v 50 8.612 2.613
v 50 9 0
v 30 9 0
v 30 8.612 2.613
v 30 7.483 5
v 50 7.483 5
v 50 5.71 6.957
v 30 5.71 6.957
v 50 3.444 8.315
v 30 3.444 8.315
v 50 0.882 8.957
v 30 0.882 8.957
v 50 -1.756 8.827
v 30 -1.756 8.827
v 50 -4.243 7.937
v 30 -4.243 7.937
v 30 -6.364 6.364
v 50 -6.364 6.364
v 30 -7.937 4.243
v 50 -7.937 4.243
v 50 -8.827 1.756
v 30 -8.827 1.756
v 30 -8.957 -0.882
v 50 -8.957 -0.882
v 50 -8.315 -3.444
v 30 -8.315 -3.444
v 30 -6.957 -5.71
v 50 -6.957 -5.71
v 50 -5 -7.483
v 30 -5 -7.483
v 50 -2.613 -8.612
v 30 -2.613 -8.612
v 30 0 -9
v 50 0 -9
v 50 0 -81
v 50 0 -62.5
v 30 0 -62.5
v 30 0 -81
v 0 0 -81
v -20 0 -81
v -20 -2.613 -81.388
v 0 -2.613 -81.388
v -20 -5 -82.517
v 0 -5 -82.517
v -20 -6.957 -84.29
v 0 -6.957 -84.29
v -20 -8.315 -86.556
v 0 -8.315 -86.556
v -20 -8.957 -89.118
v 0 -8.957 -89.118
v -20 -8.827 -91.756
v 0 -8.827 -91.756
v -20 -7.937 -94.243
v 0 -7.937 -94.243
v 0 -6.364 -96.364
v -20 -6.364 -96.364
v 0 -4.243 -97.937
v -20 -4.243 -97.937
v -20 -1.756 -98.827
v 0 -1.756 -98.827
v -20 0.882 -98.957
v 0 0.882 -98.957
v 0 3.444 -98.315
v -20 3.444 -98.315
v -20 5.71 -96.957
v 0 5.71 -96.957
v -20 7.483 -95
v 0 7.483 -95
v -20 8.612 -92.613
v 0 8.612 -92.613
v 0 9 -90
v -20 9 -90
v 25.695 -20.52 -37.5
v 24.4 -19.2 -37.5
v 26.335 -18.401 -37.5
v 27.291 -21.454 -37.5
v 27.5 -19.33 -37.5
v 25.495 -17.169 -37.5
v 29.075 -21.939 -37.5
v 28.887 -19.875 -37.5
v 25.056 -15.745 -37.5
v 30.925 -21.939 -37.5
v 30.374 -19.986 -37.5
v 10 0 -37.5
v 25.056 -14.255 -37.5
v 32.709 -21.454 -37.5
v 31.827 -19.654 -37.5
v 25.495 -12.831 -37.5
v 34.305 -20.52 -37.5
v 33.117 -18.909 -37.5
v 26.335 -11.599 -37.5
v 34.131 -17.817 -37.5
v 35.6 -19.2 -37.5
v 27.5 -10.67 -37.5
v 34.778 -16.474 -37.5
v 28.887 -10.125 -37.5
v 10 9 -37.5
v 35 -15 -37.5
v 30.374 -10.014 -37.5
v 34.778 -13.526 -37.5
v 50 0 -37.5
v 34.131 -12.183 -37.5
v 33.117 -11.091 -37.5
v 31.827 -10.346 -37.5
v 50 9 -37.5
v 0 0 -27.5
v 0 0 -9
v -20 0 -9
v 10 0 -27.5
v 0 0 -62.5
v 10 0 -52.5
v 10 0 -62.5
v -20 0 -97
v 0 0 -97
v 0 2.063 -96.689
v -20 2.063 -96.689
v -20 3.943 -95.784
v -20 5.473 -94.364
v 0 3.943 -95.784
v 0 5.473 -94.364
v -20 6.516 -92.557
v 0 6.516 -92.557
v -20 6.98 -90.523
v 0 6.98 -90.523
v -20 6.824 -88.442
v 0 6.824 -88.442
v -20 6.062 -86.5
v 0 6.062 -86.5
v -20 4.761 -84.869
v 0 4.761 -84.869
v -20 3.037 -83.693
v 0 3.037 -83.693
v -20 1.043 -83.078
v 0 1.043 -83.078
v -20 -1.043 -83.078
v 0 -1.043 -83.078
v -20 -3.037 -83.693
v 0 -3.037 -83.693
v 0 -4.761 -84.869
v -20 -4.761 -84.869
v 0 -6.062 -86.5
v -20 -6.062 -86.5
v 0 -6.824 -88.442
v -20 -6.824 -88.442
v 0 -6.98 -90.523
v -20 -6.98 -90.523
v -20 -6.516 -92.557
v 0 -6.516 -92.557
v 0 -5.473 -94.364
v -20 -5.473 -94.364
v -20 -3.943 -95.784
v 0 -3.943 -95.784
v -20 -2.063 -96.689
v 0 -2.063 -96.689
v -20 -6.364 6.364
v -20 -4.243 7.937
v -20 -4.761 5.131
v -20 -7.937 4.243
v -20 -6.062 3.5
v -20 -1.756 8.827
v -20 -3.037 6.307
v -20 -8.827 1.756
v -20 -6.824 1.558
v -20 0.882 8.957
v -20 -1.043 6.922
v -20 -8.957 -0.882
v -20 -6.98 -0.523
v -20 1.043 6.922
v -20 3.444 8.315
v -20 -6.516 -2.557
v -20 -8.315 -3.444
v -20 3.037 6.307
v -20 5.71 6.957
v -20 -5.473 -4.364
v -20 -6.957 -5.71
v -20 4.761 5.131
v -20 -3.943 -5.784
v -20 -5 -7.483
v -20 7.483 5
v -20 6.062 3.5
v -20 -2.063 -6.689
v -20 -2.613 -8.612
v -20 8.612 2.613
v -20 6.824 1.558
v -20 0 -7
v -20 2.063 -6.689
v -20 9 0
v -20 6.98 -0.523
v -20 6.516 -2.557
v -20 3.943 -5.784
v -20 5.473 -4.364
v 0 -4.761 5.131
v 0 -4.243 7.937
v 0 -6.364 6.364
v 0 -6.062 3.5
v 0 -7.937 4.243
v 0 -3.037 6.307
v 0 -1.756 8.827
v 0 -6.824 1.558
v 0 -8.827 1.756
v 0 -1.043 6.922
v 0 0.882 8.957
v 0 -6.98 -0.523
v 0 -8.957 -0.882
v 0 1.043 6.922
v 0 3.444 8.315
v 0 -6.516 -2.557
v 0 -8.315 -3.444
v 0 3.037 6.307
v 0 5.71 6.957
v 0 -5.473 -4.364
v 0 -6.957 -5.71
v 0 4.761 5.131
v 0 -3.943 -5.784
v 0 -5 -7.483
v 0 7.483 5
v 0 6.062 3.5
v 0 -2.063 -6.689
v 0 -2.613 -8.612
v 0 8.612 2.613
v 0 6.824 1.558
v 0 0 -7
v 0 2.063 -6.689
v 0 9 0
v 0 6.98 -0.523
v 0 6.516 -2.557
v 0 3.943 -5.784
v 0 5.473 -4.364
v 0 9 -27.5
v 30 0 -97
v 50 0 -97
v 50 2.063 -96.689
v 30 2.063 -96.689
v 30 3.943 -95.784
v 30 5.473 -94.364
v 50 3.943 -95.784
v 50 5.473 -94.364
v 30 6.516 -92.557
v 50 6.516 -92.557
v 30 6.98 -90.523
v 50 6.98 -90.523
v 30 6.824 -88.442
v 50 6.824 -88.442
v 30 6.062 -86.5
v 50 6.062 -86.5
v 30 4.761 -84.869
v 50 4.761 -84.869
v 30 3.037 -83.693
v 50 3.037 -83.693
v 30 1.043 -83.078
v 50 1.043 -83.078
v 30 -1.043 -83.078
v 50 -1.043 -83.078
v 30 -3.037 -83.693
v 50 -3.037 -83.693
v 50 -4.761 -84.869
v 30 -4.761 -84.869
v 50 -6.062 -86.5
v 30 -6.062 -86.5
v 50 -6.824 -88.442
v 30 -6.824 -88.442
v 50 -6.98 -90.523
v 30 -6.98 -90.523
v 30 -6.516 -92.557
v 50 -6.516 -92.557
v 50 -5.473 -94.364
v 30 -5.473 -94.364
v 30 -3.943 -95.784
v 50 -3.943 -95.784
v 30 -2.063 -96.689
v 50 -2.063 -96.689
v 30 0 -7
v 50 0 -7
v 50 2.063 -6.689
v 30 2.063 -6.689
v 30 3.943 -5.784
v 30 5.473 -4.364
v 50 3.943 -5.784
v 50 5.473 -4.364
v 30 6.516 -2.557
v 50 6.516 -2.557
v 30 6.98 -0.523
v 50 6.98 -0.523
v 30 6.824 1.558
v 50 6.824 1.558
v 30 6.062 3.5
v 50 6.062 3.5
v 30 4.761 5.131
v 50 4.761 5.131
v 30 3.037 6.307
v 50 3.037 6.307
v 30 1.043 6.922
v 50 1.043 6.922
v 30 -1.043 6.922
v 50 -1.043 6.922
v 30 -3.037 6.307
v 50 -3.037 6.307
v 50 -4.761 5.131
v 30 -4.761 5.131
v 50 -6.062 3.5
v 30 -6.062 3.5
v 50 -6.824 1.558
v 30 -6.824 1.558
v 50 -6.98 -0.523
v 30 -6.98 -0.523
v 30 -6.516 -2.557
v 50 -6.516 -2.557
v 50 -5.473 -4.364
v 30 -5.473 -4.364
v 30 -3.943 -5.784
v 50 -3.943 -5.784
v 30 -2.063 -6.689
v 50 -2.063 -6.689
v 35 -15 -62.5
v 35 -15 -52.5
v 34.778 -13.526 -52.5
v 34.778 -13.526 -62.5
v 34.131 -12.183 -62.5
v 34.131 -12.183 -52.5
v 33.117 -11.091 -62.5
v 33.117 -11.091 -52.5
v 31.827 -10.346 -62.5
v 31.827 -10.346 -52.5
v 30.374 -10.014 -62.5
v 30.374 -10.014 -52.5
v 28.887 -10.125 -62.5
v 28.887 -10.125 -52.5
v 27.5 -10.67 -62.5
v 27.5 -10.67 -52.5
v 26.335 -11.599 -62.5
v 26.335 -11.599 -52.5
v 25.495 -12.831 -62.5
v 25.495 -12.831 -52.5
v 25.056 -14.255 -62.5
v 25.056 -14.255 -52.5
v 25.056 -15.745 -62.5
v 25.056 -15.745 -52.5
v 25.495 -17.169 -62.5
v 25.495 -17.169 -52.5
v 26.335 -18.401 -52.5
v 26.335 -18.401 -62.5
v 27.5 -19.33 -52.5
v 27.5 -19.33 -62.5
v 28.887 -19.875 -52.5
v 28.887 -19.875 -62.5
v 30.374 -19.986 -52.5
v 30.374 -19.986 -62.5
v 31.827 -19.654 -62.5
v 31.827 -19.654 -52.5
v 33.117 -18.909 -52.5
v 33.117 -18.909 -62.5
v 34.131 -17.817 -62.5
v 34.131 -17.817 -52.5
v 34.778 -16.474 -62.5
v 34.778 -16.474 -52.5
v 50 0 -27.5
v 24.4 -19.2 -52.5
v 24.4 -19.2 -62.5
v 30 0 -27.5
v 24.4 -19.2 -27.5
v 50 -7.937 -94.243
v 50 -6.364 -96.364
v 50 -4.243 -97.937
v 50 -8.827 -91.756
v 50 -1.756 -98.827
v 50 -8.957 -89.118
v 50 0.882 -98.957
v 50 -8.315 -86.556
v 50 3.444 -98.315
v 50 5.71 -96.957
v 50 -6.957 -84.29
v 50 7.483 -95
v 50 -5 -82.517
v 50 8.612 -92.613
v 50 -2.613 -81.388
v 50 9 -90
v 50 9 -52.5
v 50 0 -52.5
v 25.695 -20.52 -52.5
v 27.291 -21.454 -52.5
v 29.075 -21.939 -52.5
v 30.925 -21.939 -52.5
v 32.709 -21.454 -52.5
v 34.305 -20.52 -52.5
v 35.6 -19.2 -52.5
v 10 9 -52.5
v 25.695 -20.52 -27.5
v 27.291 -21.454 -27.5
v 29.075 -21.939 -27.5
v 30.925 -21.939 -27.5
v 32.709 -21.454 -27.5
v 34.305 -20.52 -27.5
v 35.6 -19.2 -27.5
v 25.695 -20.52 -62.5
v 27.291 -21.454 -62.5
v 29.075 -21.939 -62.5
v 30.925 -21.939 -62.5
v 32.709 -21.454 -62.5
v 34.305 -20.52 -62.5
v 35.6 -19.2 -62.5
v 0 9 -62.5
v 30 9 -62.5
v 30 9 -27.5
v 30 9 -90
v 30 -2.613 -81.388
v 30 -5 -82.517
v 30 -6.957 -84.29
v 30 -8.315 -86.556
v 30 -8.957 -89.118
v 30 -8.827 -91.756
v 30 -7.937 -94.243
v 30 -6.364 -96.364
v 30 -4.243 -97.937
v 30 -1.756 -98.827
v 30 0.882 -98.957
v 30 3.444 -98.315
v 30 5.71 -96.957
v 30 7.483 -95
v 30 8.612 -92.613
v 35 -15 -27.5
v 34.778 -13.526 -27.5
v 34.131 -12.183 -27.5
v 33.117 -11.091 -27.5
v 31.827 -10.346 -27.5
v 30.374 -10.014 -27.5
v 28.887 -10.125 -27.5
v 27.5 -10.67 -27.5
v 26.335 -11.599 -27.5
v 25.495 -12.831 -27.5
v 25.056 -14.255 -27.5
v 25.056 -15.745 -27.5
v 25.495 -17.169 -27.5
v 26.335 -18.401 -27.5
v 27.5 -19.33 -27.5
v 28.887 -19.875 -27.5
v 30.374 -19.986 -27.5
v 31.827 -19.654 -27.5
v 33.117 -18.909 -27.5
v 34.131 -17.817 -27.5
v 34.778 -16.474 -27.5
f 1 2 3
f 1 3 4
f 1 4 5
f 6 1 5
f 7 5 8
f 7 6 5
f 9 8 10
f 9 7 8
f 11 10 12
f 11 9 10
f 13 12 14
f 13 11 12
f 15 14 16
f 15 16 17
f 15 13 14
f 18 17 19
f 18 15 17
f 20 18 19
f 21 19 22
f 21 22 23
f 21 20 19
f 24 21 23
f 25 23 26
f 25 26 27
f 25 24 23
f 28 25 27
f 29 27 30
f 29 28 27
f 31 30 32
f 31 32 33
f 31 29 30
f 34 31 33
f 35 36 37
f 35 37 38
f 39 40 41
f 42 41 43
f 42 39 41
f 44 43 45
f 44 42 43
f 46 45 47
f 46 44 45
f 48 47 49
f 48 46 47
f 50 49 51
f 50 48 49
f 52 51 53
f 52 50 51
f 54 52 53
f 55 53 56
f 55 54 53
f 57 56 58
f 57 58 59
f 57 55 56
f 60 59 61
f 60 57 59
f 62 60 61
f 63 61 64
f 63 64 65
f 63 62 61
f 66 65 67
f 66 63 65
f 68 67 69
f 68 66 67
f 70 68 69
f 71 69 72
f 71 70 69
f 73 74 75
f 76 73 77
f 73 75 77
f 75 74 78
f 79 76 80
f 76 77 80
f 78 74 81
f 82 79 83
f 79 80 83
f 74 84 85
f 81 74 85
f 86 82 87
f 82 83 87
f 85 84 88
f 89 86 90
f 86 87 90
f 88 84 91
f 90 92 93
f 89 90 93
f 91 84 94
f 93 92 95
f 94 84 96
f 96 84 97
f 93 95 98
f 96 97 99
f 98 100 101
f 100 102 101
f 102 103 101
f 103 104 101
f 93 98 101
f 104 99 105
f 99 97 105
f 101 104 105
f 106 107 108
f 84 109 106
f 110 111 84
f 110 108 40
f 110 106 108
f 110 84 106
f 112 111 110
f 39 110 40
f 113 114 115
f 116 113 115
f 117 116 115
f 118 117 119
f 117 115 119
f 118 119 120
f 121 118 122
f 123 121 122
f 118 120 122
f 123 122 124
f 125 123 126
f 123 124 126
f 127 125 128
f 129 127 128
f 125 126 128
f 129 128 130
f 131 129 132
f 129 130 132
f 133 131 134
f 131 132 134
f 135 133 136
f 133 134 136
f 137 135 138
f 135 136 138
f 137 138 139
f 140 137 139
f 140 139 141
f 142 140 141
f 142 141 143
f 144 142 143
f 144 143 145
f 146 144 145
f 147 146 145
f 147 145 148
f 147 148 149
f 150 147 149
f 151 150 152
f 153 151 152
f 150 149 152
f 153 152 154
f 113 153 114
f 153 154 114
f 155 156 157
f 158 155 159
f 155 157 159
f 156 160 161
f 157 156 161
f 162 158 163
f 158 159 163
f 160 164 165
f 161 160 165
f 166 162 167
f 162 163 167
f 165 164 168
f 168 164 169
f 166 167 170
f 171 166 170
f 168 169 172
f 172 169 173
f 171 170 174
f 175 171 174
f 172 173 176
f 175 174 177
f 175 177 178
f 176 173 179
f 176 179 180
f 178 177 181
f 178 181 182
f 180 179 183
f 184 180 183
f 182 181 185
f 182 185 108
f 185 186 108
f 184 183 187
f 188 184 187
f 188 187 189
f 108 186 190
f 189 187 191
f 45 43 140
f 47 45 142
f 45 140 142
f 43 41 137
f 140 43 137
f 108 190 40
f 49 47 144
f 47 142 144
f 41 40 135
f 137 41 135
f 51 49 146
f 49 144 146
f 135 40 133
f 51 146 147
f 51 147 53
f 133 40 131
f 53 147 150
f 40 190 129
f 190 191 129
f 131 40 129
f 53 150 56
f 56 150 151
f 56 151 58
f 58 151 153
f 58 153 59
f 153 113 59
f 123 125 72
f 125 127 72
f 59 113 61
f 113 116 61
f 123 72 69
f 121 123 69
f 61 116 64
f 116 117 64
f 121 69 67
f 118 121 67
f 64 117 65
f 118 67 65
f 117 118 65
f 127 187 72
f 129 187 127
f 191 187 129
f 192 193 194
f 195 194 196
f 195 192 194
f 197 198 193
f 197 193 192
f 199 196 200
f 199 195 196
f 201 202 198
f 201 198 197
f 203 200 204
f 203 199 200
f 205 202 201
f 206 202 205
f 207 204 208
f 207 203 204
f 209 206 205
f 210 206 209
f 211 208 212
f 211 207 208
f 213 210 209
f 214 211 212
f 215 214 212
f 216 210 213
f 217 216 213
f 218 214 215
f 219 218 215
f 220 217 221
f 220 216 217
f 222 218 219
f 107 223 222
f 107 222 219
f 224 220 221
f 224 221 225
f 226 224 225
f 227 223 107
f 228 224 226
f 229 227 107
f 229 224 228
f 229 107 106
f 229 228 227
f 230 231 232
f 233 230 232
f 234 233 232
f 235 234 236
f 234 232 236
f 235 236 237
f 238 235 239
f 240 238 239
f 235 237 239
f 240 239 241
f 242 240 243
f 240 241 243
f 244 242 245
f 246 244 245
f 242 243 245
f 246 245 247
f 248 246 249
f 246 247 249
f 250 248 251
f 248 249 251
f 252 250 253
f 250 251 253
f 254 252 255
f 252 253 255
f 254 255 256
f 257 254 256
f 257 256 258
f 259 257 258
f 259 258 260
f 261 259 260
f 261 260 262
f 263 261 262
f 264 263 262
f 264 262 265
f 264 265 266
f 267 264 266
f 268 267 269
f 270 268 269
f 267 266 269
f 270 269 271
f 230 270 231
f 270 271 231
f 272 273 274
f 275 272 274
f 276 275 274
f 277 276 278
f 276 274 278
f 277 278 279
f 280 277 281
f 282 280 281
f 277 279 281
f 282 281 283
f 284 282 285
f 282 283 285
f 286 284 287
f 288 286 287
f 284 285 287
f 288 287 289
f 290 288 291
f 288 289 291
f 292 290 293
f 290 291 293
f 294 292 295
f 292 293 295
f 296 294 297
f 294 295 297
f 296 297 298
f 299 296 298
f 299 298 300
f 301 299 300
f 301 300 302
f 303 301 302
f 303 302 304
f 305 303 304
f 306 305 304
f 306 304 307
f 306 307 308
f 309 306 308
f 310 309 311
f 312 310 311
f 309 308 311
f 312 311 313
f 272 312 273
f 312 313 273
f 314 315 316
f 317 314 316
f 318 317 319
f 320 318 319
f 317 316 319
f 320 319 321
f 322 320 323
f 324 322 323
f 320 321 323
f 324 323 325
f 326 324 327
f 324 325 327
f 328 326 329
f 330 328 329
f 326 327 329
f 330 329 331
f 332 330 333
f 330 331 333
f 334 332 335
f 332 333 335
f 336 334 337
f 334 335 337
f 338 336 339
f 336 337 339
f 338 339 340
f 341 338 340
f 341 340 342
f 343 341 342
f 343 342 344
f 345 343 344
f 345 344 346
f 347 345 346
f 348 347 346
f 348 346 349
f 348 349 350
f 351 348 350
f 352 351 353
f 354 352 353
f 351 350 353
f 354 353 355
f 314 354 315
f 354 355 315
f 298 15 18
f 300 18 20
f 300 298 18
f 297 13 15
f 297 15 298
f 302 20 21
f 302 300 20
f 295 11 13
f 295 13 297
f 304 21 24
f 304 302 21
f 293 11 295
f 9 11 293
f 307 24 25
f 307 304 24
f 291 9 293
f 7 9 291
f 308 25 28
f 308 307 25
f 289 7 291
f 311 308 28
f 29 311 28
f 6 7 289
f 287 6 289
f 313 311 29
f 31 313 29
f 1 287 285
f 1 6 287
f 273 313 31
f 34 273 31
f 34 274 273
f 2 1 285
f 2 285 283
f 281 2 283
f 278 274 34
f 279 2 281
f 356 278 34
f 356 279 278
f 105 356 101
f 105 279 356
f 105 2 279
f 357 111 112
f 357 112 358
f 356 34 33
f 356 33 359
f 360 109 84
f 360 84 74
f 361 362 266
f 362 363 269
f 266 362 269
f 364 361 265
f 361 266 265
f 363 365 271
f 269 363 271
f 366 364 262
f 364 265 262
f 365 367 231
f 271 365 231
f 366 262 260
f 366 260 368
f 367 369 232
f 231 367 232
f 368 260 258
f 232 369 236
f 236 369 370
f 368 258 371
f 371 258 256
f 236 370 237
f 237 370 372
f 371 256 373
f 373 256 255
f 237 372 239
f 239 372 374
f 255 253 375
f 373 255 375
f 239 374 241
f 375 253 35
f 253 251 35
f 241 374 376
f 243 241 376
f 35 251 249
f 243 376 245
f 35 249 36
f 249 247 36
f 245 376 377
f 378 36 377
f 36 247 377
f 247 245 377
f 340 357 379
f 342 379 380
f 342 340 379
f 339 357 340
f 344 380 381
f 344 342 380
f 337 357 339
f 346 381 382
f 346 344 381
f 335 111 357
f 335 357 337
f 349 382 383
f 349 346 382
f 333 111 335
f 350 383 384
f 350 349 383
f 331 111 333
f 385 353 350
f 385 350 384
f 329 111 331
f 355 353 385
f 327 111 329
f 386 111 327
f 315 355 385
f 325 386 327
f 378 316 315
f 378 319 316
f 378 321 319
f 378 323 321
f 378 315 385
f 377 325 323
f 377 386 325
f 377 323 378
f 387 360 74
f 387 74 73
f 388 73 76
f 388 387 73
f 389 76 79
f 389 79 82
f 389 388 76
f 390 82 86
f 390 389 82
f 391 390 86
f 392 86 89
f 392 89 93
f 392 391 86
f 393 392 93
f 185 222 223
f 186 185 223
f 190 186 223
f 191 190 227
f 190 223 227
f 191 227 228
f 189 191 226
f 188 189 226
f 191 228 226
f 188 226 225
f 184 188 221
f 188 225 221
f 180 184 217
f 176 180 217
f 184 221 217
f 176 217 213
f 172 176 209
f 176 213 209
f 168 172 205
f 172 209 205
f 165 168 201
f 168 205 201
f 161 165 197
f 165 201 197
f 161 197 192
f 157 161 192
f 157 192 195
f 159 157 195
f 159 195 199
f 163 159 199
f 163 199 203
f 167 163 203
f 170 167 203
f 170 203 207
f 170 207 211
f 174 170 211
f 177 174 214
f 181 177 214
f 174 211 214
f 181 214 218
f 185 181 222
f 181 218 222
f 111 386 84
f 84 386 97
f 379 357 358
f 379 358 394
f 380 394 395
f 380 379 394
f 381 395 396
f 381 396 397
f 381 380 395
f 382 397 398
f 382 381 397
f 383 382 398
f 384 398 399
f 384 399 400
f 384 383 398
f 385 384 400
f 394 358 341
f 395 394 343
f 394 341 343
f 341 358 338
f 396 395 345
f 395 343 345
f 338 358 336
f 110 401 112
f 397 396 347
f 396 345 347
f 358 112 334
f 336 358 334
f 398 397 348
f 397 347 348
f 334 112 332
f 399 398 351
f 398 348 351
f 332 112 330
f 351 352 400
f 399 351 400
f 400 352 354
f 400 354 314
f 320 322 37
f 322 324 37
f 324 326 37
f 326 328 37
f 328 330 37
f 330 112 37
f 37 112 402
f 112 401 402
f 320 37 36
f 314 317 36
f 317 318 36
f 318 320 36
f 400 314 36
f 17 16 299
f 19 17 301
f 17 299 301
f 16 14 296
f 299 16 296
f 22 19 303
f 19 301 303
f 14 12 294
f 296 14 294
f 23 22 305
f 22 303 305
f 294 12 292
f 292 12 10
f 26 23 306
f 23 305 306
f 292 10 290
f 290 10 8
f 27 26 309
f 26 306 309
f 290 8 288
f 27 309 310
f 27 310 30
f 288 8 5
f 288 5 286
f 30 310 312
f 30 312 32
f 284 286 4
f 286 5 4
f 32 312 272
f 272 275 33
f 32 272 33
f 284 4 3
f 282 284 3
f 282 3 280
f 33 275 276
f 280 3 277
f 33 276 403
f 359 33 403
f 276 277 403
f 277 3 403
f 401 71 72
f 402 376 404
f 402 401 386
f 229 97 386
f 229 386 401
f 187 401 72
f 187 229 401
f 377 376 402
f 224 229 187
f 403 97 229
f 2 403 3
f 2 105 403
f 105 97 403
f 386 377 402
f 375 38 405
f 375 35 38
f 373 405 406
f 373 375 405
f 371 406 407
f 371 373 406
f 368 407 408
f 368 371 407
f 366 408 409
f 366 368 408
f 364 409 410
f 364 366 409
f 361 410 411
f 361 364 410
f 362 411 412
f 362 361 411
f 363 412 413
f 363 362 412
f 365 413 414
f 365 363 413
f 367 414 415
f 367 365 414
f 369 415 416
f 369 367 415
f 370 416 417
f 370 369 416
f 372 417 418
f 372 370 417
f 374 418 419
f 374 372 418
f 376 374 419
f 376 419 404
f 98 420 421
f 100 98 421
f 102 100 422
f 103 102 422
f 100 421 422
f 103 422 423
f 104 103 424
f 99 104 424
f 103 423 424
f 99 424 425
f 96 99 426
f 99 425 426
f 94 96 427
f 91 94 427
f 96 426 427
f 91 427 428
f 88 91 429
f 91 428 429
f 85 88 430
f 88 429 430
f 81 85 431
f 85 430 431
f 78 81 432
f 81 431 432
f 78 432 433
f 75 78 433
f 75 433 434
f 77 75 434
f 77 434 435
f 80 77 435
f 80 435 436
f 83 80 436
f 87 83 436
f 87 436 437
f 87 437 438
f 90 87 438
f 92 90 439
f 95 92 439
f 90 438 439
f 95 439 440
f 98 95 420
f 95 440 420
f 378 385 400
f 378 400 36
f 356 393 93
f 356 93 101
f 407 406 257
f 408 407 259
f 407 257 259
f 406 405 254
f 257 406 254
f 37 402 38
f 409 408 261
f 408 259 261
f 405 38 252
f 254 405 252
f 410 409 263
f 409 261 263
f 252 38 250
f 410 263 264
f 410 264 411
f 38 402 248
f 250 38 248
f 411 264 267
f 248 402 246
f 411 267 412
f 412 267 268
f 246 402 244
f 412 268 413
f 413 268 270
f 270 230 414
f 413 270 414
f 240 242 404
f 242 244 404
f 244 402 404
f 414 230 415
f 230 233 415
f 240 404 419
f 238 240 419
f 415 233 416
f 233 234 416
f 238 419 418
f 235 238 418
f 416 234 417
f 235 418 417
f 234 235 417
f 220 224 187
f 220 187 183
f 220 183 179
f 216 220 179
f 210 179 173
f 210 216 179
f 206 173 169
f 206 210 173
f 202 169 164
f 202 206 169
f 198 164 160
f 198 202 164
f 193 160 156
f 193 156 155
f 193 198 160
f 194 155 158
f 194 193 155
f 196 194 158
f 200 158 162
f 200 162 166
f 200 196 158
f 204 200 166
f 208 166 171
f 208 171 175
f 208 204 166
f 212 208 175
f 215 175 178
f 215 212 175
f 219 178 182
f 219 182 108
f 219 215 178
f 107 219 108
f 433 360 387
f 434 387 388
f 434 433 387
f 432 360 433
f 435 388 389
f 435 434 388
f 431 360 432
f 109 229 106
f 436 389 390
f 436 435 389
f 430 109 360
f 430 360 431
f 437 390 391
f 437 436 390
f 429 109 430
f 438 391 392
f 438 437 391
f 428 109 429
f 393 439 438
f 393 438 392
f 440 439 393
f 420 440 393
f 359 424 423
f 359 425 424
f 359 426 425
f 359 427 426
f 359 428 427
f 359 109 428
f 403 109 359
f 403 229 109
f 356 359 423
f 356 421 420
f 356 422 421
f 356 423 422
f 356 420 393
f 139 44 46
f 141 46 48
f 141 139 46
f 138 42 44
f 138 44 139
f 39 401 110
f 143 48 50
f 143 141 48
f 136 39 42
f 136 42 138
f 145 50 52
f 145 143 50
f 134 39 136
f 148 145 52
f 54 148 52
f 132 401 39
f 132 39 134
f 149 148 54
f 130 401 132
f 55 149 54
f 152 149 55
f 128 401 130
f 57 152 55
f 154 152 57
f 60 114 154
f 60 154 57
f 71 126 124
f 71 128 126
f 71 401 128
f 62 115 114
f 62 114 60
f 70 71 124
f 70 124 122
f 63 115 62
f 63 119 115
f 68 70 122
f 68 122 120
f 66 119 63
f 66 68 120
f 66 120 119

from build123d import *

# Parameters (mm, degrees)
SKETCH1_R           = 9
SKETCH1_R_2         = 7
BOSS_EXTRUDE1_DEPTH = 20
BOSS_EXTRUDE2_DEPTH = 9
SKETCH3_R           = 9
SKETCH3_R_2         = 7
BOSS_EXTRUDE4_DEPTH = 20
SKETCH6_R           = 5
BOSS_EXTRUDE7_DEPTH = 10
BOSS_EXTRUDE8_START = 25
SKETCH6_3_R         = 5
BOSS_EXTRUDE8_DEPTH = 10


with BuildPart() as part:
    # Sketch1 → Boss-Extrude1 (new body)
    # profile 1 of 3: a face of its own
    with BuildSketch(Plane(origin=(0, 0, 0), x_dir=(0, 0, -1), z_dir=(1, 0, 0))):
        with BuildLine():
            Line((90, 9), (0, 9))
            ThreePointArc((0, 9), (6.363961031, 6.363961031), (9, 0))
            Line((9, 0), (81, 0))
            ThreePointArc((81, 0), (83.636038969, 6.363961031), (90, 9))
        make_face()
    # profile 2 of 3: a face of its own
    with BuildSketch(Plane(origin=(0, 0, 0), x_dir=(0, 0, -1), z_dir=(1, 0, 0))):
        Circle(SKETCH1_R)
        Circle(SKETCH1_R_2, mode=Mode.SUBTRACT)
    # profile 3 of 3: a face of its own
    with BuildSketch(Plane(origin=(0, 0, 0), x_dir=(0, 0, -1), z_dir=(1, 0, 0))):
        with Locations((90, 0)):
            Circle(SKETCH1_R)
        with Locations((90, 0)):
            Circle(SKETCH1_R_2, mode=Mode.SUBTRACT)
    extrude(amount=-BOSS_EXTRUDE1_DEPTH)

    # Sketch2 → Boss-Extrude2 (add)
    with BuildSketch(Plane(origin=(0, 9, 0), x_dir=(1, 0, 0), z_dir=(0, 1, 0))):
        Polygon((0, 62.5), (50, 62.5), (50, 52.5), (10, 52.5), (10, 37.5), (50, 37.5), (50, 27.5), (0, 27.5), align=None)
    extrude(amount=-BOSS_EXTRUDE2_DEPTH)

    # Sketch3 → Boss-Extrude4 (add)
    # profile 1 of 4: a face of its own
    with BuildSketch(Plane(origin=(50, 0, 0), x_dir=(0, 0, -1), z_dir=(1, 0, 0))):
        Circle(SKETCH3_R)
        Circle(SKETCH3_R_2, mode=Mode.SUBTRACT)
    # profile 2 of 4: a face of its own
    with BuildSketch(Plane(origin=(50, 0, 0), x_dir=(0, 0, -1), z_dir=(1, 0, 0))):
        with BuildLine():
            Line((27.5, 9), (0, 9))
            ThreePointArc((0, 9), (6.363961031, 6.363961031), (9, 0))
            Line((9, 0), (27.5, 0))
            Line((27.5, 0), (27.5, 9))
        make_face()
    # profile 3 of 4: a face of its own
    with BuildSketch(Plane(origin=(50, 0, 0), x_dir=(0, 0, -1), z_dir=(1, 0, 0))):
        with BuildLine():
            Line((90, 9), (52.5, 9))
            Line((52.5, 9), (52.5, 0))
            Line((52.5, 0), (81, 0))
            ThreePointArc((81, 0), (83.636038969, 6.363961031), (90, 9))
        make_face()
    # profile 4 of 4: a face of its own
    with BuildSketch(Plane(origin=(50, 0, 0), x_dir=(0, 0, -1), z_dir=(1, 0, 0))):
        with Locations((90, 0)):
            Circle(SKETCH3_R)
        with Locations((90, 0)):
            Circle(SKETCH3_R_2, mode=Mode.SUBTRACT)
    extrude(amount=-BOSS_EXTRUDE4_DEPTH)

    # Sketch6 → Boss-Extrude7 (add)
    with BuildSketch(Plane.XY.offset(-52.5)):
        with BuildLine():
            Line((10, 0), (24.4, -19.2))
            ThreePointArc((24.4, -19.2), (30, -22), (35.6, -19.2))
            Line((35.6, -19.2), (50, 0))
            Line((50, 0), (10, 0))
        make_face()
        with Locations((30, -15)):
            Circle(SKETCH6_R, mode=Mode.SUBTRACT)
    extrude(amount=-BOSS_EXTRUDE7_DEPTH)

    # Sketch6<3> → Boss-Extrude8 (add)
    with BuildSketch(Plane.XY.offset(-52.5).offset(BOSS_EXTRUDE8_START)):
        with BuildLine():
            Line((10, 0), (24.4, -19.2))
            ThreePointArc((24.4, -19.2), (30, -22), (35.6, -19.2))
            Line((35.6, -19.2), (50, 0))
            Line((50, 0), (10, 0))
        make_face()
        with Locations((30, -15)):
            Circle(SKETCH6_3_R, mode=Mode.SUBTRACT)
    extrude(amount=-BOSS_EXTRUDE8_DEPTH)


solid = part.part
